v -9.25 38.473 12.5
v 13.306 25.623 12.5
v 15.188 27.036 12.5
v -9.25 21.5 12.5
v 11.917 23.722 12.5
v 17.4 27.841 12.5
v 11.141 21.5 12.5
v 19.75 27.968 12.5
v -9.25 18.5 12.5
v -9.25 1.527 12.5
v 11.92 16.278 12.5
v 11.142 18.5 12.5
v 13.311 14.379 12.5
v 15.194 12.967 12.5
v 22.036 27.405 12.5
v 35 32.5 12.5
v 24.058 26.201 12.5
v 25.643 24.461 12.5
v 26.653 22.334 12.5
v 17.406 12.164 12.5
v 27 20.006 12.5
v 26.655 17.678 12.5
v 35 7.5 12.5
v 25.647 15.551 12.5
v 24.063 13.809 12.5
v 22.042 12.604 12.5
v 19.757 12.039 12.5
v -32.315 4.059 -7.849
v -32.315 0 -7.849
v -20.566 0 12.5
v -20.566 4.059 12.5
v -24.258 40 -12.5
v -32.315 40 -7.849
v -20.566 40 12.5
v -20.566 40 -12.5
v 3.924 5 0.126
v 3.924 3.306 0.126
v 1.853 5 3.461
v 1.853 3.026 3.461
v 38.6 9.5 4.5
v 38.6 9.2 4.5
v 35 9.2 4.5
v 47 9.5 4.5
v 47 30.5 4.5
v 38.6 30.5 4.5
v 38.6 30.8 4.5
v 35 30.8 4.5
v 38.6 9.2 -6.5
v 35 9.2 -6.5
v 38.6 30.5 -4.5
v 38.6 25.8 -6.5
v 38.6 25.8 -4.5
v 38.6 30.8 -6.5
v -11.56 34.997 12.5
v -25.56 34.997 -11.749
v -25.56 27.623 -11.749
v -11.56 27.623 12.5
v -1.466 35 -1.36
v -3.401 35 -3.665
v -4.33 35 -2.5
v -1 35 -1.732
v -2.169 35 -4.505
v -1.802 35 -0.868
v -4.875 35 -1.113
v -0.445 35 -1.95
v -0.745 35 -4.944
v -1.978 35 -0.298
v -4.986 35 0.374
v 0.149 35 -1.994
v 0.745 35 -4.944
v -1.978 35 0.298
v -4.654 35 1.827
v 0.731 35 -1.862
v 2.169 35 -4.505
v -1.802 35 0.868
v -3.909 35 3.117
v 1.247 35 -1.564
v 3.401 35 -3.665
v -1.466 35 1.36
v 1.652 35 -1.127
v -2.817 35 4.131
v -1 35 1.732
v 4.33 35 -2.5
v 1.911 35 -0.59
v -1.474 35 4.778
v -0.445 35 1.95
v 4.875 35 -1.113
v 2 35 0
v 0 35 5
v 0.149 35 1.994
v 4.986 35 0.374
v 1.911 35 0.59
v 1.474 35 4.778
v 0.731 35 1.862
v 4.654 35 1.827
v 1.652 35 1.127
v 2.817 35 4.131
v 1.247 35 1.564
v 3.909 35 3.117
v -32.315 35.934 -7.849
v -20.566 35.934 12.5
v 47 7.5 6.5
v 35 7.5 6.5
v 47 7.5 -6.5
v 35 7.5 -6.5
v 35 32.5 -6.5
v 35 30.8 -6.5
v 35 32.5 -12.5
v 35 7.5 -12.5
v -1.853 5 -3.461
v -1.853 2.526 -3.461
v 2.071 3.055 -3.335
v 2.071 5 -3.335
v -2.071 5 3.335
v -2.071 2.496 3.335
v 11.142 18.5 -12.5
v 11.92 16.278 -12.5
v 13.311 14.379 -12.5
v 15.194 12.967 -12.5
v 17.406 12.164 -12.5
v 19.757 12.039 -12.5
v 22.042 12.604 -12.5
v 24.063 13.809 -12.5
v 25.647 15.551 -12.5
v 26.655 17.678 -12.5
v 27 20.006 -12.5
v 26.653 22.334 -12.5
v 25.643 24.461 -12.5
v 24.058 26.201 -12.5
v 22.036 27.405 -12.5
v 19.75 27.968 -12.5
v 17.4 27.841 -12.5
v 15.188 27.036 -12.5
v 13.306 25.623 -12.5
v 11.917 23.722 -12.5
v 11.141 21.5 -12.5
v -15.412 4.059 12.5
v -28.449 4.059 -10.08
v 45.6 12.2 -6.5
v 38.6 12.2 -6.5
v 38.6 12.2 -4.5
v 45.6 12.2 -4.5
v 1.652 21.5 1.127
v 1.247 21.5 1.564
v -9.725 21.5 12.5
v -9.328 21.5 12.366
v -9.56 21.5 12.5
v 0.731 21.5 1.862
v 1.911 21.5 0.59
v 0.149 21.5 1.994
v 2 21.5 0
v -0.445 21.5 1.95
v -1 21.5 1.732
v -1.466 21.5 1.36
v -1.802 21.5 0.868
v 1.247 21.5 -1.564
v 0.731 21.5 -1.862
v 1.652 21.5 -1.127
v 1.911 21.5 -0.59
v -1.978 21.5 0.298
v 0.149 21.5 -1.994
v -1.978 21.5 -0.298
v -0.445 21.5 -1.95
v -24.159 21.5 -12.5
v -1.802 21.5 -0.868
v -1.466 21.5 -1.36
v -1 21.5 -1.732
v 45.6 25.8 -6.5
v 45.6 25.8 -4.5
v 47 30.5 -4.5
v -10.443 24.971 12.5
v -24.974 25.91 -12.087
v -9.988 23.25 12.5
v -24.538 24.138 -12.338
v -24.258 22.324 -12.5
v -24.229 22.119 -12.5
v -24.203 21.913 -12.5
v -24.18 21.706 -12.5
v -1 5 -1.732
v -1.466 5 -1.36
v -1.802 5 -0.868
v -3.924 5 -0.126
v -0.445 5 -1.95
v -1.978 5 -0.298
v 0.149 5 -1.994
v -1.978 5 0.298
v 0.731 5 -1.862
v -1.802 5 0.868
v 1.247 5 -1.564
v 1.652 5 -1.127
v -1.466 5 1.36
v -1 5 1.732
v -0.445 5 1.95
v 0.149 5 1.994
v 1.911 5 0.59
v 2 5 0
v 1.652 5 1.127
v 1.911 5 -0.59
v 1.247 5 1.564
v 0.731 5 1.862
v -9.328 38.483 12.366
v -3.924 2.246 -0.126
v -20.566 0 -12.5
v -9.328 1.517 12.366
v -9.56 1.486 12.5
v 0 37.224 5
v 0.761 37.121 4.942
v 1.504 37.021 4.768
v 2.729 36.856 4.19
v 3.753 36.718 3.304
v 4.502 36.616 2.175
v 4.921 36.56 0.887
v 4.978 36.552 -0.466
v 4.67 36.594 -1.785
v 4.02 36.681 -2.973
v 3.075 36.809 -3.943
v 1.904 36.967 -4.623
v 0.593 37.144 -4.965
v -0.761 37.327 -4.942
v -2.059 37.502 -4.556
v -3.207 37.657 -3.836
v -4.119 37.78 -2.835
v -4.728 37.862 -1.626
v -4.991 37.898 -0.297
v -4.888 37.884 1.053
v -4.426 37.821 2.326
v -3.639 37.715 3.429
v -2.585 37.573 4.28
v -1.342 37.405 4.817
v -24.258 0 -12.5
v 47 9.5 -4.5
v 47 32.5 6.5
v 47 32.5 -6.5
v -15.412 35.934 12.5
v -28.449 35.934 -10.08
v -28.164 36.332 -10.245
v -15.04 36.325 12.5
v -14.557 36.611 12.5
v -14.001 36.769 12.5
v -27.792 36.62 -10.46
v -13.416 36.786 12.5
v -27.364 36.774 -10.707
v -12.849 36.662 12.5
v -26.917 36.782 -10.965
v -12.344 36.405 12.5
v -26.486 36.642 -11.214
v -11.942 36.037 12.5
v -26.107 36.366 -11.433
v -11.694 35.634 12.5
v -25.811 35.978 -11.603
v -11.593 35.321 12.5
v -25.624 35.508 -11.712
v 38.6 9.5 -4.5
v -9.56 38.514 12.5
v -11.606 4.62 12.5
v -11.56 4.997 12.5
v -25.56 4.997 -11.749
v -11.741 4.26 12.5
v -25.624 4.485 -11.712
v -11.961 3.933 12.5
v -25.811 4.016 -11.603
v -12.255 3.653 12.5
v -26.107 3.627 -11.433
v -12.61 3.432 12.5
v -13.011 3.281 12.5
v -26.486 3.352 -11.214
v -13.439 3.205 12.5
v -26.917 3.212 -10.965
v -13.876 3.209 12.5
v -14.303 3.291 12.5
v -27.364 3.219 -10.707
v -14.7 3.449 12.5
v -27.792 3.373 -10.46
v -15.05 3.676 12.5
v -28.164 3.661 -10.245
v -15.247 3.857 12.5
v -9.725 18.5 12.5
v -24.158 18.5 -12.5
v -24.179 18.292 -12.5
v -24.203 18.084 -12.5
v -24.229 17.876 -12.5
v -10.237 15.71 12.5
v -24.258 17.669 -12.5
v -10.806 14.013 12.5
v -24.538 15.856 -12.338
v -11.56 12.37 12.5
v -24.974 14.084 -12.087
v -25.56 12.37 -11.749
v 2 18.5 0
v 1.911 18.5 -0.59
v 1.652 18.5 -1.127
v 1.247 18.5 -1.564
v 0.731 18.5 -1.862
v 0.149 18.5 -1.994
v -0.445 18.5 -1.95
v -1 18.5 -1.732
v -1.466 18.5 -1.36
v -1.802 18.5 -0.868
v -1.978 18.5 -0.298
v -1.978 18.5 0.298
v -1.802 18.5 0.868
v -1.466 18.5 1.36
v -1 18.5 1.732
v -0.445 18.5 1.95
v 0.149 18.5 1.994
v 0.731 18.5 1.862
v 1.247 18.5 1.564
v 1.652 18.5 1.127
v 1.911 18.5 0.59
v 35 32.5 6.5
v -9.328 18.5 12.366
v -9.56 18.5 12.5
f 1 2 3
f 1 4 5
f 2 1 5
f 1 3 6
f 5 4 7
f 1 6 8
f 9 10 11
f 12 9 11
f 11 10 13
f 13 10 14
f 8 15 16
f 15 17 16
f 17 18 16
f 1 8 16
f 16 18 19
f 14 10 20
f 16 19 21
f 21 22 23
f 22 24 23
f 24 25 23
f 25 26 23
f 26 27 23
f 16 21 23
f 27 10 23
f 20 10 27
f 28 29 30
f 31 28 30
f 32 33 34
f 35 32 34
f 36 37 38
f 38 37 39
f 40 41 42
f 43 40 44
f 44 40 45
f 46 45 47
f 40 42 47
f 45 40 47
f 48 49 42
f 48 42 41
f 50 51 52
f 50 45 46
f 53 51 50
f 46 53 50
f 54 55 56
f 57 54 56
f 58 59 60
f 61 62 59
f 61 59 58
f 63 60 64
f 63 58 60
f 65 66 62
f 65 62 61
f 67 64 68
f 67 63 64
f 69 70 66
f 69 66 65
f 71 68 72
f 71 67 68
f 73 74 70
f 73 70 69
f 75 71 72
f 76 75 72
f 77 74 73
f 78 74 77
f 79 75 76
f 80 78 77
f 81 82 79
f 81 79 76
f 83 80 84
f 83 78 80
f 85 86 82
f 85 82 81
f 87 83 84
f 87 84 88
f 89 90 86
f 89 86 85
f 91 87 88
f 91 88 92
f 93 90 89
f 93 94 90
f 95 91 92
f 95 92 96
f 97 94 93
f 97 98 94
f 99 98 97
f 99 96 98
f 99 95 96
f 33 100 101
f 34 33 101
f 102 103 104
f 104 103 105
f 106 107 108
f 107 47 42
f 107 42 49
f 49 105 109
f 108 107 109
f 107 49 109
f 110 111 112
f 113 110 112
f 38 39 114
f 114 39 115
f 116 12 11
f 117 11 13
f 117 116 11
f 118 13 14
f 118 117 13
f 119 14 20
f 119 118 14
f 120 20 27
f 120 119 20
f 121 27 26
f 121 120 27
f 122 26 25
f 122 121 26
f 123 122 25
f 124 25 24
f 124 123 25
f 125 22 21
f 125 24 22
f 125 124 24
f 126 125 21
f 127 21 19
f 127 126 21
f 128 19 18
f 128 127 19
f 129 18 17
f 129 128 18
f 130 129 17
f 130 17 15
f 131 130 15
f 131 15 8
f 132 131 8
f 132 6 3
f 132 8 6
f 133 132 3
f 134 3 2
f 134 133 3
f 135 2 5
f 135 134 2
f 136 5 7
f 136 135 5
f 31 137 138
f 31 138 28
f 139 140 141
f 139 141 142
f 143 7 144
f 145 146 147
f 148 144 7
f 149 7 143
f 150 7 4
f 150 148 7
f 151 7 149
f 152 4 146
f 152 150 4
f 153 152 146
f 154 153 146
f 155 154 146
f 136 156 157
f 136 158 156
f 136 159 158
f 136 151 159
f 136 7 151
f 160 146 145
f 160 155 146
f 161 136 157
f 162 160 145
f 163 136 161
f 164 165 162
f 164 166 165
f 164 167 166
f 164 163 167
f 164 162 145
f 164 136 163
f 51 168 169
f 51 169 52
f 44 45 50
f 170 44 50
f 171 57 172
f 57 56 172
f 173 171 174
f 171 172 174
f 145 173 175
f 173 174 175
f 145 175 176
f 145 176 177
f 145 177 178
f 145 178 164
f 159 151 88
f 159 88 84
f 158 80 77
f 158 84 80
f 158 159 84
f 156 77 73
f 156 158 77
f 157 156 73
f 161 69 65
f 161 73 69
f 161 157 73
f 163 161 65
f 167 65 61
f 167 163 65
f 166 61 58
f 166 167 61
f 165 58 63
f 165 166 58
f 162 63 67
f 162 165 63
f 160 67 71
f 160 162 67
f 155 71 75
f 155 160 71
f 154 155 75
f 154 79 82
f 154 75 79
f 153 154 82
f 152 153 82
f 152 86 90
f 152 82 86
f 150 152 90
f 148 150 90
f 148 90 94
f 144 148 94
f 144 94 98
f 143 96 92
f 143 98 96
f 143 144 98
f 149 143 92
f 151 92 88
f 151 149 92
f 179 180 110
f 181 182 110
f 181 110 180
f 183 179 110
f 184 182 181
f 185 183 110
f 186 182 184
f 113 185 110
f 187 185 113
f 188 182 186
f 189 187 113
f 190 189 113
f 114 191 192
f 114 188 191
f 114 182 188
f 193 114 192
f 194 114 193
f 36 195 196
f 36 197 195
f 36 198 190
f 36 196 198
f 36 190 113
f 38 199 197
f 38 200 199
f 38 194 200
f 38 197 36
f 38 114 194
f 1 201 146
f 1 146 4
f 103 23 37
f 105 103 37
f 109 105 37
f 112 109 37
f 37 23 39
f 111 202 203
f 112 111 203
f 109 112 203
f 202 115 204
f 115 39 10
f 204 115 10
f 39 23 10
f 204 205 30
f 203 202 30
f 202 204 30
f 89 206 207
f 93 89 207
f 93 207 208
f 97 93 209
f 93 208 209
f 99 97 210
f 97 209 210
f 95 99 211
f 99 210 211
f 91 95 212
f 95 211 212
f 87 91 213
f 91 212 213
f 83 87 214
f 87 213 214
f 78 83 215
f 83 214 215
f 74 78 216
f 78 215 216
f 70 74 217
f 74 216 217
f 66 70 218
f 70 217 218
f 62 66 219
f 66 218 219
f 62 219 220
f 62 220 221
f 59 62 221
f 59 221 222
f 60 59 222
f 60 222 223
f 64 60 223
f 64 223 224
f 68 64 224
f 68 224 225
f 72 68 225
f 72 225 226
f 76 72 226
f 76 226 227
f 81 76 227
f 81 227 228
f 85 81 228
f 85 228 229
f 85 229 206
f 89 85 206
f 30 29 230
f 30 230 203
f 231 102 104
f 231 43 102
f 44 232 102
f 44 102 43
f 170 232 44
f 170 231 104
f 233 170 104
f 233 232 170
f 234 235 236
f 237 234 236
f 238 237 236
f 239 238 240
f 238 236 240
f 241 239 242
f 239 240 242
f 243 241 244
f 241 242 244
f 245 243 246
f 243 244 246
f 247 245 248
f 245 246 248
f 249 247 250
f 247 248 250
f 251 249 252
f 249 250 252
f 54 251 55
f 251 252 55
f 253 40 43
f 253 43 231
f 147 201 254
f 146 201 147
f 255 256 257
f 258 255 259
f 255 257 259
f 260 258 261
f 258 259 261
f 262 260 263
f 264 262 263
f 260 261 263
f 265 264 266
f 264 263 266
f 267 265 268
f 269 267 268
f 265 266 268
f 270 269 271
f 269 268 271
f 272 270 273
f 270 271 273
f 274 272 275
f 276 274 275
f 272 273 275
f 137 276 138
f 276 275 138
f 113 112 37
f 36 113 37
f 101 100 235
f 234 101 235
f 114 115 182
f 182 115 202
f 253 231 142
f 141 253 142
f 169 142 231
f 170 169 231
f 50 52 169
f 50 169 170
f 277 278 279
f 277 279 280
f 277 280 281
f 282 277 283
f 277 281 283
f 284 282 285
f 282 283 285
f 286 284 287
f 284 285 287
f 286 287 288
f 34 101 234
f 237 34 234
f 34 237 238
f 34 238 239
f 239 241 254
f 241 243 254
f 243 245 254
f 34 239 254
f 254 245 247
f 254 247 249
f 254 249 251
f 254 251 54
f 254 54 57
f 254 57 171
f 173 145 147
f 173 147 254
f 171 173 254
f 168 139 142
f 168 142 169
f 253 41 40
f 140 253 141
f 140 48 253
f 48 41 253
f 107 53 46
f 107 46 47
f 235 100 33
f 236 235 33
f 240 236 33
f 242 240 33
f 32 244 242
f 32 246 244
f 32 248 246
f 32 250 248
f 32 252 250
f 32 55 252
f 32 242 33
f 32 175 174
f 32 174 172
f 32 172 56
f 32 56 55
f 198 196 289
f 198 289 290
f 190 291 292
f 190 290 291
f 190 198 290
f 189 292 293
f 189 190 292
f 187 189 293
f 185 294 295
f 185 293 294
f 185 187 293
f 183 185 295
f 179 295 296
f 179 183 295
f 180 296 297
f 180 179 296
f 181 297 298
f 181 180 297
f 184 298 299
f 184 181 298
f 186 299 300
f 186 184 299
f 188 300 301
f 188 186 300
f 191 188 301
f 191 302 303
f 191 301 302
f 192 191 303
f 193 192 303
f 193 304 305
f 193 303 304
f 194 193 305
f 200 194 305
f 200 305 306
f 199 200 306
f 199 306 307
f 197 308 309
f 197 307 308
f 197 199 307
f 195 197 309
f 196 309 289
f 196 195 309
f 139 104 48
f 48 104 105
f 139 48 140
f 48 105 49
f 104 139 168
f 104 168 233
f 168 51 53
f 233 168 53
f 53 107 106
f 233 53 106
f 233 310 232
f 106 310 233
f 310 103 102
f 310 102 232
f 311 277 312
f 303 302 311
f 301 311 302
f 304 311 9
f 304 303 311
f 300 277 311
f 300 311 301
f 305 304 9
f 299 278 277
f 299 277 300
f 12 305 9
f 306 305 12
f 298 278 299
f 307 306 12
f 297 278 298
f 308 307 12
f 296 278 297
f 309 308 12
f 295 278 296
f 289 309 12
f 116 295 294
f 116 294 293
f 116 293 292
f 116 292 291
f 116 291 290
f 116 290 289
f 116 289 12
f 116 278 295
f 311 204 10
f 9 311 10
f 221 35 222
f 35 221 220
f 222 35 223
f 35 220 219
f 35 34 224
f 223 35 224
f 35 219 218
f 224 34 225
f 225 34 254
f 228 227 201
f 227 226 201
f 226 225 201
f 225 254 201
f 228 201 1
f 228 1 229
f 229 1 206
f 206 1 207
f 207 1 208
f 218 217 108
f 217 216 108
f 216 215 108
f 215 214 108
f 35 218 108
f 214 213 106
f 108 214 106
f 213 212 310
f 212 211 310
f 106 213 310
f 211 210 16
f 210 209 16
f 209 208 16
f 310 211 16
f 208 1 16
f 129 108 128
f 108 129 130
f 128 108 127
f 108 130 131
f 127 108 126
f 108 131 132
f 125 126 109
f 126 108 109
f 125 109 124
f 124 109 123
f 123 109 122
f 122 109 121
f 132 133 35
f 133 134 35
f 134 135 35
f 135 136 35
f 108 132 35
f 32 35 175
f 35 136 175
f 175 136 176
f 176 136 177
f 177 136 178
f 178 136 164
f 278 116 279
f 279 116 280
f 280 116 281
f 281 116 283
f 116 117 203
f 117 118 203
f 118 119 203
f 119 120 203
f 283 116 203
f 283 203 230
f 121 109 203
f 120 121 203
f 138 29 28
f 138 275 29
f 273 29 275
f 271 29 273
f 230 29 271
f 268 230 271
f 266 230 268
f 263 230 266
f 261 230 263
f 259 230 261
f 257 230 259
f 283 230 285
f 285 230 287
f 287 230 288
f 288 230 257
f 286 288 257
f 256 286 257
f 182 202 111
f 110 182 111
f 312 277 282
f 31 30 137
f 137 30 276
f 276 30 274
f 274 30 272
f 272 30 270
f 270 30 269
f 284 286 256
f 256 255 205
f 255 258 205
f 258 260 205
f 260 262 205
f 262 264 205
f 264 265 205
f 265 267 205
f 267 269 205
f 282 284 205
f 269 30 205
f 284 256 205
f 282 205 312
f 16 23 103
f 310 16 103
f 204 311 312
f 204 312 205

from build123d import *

# Parameters (mm, degrees)
BOSS_EXTRUDE1_DEPTH     = 40
CUT_EXTRUDE1_DEPTH      = 40
SKETCH3_W               = 4.376715803
SKETCH3_H               = 7.921330006
BOSS_EXTRUDE2_DEPTH     = 40
CUT_EXTRUDE2_DEPTH      = 78.145313728
CUT_EXTRUDE2_DEPTH_BACK = 78.145313728
CUT_EXTRUDE3_DEPTH      = 40
CUT_EXTRUDE4_DEPTH      = 43.935998882
CUT_EXTRUDE4_DEPTH_BACK = 43.935998882
SKETCH6_R               = 2
CUT_EXTRUDE5_DEPTH      = 5
SKETCH8_R               = 5
CUT_EXTRUDE6_DEPTH      = 5
CUT_EXTRUDE7_START      = -2
SKETCH9_W               = 6.222682415
SKETCH9_H               = 53.403341902
CUT_EXTRUDE7_DEPTH      = 16
SKETCH10_W              = 13
SKETCH10_H              = 25
SKETCH10_W_2            = 9
SKETCH10_H_2            = 21
BOSS_EXTRUDE3_DEPTH     = 12
CUT_EXTRUDE8_DEPTH      = 11


with BuildPart() as part:
    # Sketch1 → Boss-Extrude1 (new body)
    with BuildSketch(Plane(origin=(0, 0, 0), x_dir=(1, 0, 0), z_dir=(0, 1, 0))):
        Polygon((-35, 12.5), (-20.56624327, -12.5), (35, -12.5), (35, 12.5), align=None)
    extrude(amount=BOSS_EXTRUDE1_DEPTH)

    # Sketch2 → Cut-Extrude1 (cut)
    with BuildSketch(Plane.XY.offset(12.5)):
        Polygon((-20.56624327, 40), (35, 32.5), (35, 40), align=None)
        Polygon((35, 7.5), (-20.56624327, 0), (35, 0), align=None)
    extrude(amount=-CUT_EXTRUDE1_DEPTH, mode=Mode.SUBTRACT)

    # Sketch3 → Boss-Extrude2 (add)
    with BuildSketch(Plane(origin=(-20.837341226, 0, 12.030444566), x_dir=(0.4999999999999981, 0, 0.8660254037844397), z_dir=(-0.8660254037844398, 0, 0.4999999999999982))):
        with Locations((-10.675795445, 21.421253709)):
            Rectangle(SKETCH3_W, SKETCH3_H)
    extrude(amount=BOSS_EXTRUDE2_DEPTH)

    # Sketch4 → Cut-Extrude2 (cut, two sides: drawn at the far end of the back side and taken through both)
    with BuildSketch(Plane(origin=(-4.243718771, 0, -7.350336525), x_dir=(0.8660254037844397, 0, -0.4999999999999983), z_dir=(0.4999999999999982, 0, 0.8660254037844396)).offset(-CUT_EXTRUDE2_DEPTH_BACK)):
        with BuildLine():
            Line((-25.260889132, 35.934120187), (-19.597573928, 35.934120187))
            ThreePointArc((-19.597573928, 35.934120187), (-17.574079433, 36.729704946), (-16.260889132, 34.996783621))
            Line((-16.260889132, 34.996783621), (-16.260889132, 27.623217913))
            ThreePointArc((-16.260889132, 27.623217913), (-14.610889132, 19.996783621), (-16.260889132, 12.37034933))
            Line((-16.260889132, 12.37034933), (-16.260889132, 4.996783621))
            ThreePointArc((-16.260889132, 4.996783621), (-17.574079433, 3.263862297), (-19.597573928, 4.059447055))
            Line((-19.597573928, 4.059447055), (-25.260889132, 4.059447055))
            Line((-25.260889132, 4.059447055), (-25.260889132, 11.549622397))
            Line((-25.260889132, 11.549622397), (-69.354192402, 11.549622397))
            Line((-69.354192402, 11.549622397), (-69.354192402, 27.546843348))
            Line((-69.354192402, 27.546843348), (-25.260889132, 26.613076168))
            Line((-25.260889132, 26.613076168), (-25.260889132, 35.934120187))
        make_face()
    extrude(amount=CUT_EXTRUDE2_DEPTH + CUT_EXTRUDE2_DEPTH_BACK, mode=Mode.SUBTRACT)

    # Sketch5 → Cut-Extrude3 (cut)
    with BuildSketch(Plane(origin=(0, 0, -12.5), x_dir=(-1, 0, 0), z_dir=(0, 0, -1))):
        with BuildLine():
            Line((-11.141275202, 21.5), (29.874932975, 21.5))
            Line((29.874932975, 21.5), (29.874932975, 18.5))
            Line((29.874932975, 18.5), (-11.142492493, 18.5))
            ThreePointArc((-11.142492493, 18.5), (-26.999999341, 20.006434648), (-11.141275202, 21.5))
        make_face()
    extrude(amount=-CUT_EXTRUDE3_DEPTH, mode=Mode.SUBTRACT)

    # Sketch6 → Cut-Extrude4 (cut, two sides: drawn at the far end of the back side and taken through both)
    with BuildSketch(Plane(origin=(0, 18.5, 0), x_dir=(1, 0, 0), z_dir=(0, 1, 0)).offset(-CUT_EXTRUDE4_DEPTH_BACK)):
        Circle(SKETCH6_R)
    extrude(amount=CUT_EXTRUDE4_DEPTH + CUT_EXTRUDE4_DEPTH_BACK, mode=Mode.SUBTRACT)

    # Sketch7 → Cut-Extrude5 (cut)
    with BuildSketch(Plane.XZ):
        Polygon((1.8525736, 3.461402084), (-2.071375338, 3.335076842), (-3.923948938, -0.126325242), (-1.8525736, -3.461402084), (2.071375338, -3.335076842), (3.923948938, 0.126325242), align=None)
    extrude(amount=-CUT_EXTRUDE5_DEPTH, mode=Mode.SUBTRACT)

    # Sketch8 → Cut-Extrude6 (cut)
    with BuildSketch(Plane(origin=(0, 40, 0), x_dir=(1, 0, 0), z_dir=(0, 1, 0))):
        with Locations(Location((0, 0, 0), (0, 0, 270))):
            Circle(SKETCH8_R)
    extrude(amount=-CUT_EXTRUDE6_DEPTH, mode=Mode.SUBTRACT)

    # Sketch9 → Cut-Extrude7 (cut)
    with BuildSketch(Plane(origin=(-14.082343077, 0, 8.130444566), x_dir=(0.4999999999999982, 0, 0.8660254037844397), z_dir=(-0.8660254037844398, 0, 0.4999999999999983)).offset(CUT_EXTRUDE7_START)):
        with Locations((-26.065813196, 19.047949313)):
            Rectangle(SKETCH9_W, SKETCH9_H)
        Polygon((6.045528012, 45.749620264), (6.045528012, -7.653721638), (13.717164193, -7.653721638), (13.717164193, 42.686575292), (13.717164193, 45.749620264), align=None)
    extrude(amount=CUT_EXTRUDE7_DEPTH, mode=Mode.SUBTRACT)

    # Sketch10 → Boss-Extrude3 (add)
    with BuildSketch(Plane(origin=(35, 0, 0), x_dir=(0, 0, -1), z_dir=(1, 0, 0))):
        with Locations((0, 20)):
            Rectangle(SKETCH10_W, SKETCH10_H)
        with Locations((0, 20)):
            Rectangle(SKETCH10_W_2, SKETCH10_H_2, mode=Mode.SUBTRACT)
    extrude(amount=BOSS_EXTRUDE3_DEPTH)

    # Sketch11 → Cut-Extrude8 (cut)
    with BuildSketch(Plane(origin=(0, 0, -6.5), x_dir=(-1, 0, 0), z_dir=(0, 0, -1))):
        Polygon((-38.6, 30.8), (-35, 30.8), (-35, 25.8), (-35, 12.2), (-35, 9.2), (-38.6, 9.2), (-38.6, 12.2), (-45.6, 12.2), (-45.6, 25.8), (-38.6, 25.8), align=None)
    extrude(amount=-CUT_EXTRUDE8_DEPTH, mode=Mode.SUBTRACT)


solid = part.part
